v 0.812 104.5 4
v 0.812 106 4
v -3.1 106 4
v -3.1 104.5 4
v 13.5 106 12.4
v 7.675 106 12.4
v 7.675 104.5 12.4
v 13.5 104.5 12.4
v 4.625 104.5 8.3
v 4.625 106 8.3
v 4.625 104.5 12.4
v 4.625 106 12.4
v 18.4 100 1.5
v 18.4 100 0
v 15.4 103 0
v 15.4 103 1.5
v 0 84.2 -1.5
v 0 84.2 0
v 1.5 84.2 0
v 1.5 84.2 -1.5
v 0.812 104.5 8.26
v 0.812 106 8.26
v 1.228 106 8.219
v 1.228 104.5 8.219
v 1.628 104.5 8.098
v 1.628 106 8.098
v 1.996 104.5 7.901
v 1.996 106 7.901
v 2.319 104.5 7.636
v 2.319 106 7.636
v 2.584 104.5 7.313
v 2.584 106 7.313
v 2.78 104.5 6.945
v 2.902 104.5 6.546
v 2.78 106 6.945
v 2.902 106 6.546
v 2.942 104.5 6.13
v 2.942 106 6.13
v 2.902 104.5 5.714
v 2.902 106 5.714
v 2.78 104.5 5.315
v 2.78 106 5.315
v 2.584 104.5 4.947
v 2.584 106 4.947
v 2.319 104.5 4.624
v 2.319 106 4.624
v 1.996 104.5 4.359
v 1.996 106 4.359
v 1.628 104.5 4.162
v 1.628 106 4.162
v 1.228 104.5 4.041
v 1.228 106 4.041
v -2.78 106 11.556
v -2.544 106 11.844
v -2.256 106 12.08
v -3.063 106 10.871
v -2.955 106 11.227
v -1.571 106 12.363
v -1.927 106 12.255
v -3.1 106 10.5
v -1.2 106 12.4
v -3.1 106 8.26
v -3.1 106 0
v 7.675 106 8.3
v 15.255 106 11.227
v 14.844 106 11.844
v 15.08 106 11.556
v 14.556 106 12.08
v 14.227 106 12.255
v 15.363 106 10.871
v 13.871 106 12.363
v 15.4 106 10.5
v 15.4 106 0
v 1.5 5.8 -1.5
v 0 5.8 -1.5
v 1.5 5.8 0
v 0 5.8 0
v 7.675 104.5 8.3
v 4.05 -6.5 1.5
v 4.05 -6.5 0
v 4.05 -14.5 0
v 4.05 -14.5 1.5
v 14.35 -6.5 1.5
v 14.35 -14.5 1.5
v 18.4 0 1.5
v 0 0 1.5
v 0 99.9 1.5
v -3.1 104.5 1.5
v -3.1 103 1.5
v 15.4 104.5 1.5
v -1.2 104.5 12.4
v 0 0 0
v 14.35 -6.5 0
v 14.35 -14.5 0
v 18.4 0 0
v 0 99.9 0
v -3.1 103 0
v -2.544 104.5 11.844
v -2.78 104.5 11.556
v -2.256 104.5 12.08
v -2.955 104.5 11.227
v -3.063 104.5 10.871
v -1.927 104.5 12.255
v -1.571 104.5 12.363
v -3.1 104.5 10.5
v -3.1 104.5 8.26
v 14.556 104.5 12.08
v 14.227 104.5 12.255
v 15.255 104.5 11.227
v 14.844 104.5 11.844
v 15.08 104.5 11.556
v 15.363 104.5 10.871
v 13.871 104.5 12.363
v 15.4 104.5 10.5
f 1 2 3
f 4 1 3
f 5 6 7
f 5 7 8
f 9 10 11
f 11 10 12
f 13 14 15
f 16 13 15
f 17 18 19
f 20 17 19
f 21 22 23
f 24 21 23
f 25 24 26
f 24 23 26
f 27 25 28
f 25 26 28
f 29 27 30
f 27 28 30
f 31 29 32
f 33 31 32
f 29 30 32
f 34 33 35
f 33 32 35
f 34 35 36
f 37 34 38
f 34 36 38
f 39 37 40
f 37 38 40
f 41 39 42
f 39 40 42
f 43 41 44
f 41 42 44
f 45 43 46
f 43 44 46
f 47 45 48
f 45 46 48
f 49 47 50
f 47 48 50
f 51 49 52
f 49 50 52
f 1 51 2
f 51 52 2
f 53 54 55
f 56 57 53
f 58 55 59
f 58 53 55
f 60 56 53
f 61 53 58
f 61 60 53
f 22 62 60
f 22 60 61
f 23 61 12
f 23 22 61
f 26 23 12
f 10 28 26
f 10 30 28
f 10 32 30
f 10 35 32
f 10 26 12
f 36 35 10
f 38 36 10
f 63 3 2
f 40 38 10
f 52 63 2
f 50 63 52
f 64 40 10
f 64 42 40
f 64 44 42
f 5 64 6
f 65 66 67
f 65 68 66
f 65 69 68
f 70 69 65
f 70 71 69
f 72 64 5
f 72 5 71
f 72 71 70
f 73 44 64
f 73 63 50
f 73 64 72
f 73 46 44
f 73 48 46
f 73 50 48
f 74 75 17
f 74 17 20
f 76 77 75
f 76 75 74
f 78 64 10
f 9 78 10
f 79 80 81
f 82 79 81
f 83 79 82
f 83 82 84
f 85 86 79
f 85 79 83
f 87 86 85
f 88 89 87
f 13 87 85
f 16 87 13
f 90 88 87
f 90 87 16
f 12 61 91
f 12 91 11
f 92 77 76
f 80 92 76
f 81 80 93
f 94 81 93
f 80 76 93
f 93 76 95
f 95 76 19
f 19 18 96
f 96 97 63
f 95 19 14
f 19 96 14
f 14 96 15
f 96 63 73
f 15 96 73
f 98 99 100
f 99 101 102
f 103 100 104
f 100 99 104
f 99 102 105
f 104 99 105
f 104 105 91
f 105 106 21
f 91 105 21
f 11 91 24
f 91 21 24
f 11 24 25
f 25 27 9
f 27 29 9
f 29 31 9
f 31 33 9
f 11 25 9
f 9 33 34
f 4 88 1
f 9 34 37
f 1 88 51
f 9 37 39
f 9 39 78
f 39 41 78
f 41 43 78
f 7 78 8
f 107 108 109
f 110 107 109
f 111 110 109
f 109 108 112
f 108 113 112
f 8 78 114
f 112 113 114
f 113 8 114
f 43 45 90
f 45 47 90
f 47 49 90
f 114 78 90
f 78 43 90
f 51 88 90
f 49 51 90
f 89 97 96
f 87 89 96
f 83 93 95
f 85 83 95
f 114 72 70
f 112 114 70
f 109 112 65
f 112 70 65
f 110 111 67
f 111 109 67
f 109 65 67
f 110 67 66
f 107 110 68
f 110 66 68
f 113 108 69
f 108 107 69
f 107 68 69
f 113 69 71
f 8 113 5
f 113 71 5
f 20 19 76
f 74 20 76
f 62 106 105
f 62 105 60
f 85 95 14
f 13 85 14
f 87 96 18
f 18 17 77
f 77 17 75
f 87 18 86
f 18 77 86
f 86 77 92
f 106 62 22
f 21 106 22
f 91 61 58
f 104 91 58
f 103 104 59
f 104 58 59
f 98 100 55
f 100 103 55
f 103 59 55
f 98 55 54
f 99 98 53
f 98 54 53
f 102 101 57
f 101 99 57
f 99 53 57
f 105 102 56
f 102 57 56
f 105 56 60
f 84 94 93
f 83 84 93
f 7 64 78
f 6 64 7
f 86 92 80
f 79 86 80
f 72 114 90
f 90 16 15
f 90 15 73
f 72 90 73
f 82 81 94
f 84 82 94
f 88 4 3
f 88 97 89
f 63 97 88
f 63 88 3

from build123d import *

# Parameters (mm, degrees)
F1_DEPTH = 1.5
F2_W     = 18.5
F2_H     = 1.5
F3_DEPTH = 10.9
F4_W     = 3.05
F4_H     = 4.1
F5_DEPTH = 25
F6_W     = 1.5
F6_H     = 78.4
F7_DEPTH = 1.5


with BuildPart() as f1:
    # F0 (on Top) → F1 (new body)
    with BuildSketch(Plane.XY):
        Polygon((-3.1, 103), (0, 99.9), (0, 0), (4.05, -6.5), (4.05, -14.5), (14.35, -14.5), (14.35, -6.5), (18.4, 0), (18.4, 100), (15.4, 103), (15.4, 106), (-3.1, 106), align=None)
    extrude(amount=F1_DEPTH)

    # F2 (on face) → F3 (join)
    with BuildSketch(Plane.XY.offset(1.5)):
        with Locations((6.15, 105.25)):
            Rectangle(F2_W, F2_H)
    extrude(amount=F3_DEPTH)

    # F4 (on face) → F5 (cut)
    with BuildSketch(Plane(origin=(0, 106, 0), x_dir=(-1, 0, 0), z_dir=(0, 1, 0))):
        with Locations((-6.15, 10.35)):
            Rectangle(F4_W, F4_H)
        with BuildLine():
            ThreePointArc((-15.4, 10.5), (-14.843503, 11.843503), (-13.5, 12.4))
            Line((-13.5, 12.4), (-15.4, 12.4))
            Line((-15.4, 12.4), (-15.4, 10.5))
        make_face()
        with BuildLine():
            Line((3.1, 12.4), (1.2, 12.4))
            ThreePointArc((1.2, 12.4), (2.543503, 11.843503), (3.1, 10.5))
            Line((3.1, 10.5), (3.1, 12.4))
        make_face()
        with BuildLine():
            Line((3.1, 8.26), (-0.8125, 8.26))
            ThreePointArc((-0.8125, 8.26), (-2.9425, 6.13), (-0.8125, 4))
            Line((-0.8125, 4), (3.1, 4))
            Line((3.1, 4), (3.1, 8.26))
        make_face()
    extrude(amount=-F5_DEPTH, mode=Mode.SUBTRACT)

    # F6 (on face) → F7 (join)
    with BuildSketch(Plane(origin=(0, 0, 0), x_dir=(1, 0, 0), z_dir=(0, 0, -1))):
        with Locations((0.75, -45)):
            Rectangle(F6_W, F6_H)
    extrude(amount=F7_DEPTH)


solid = f1.part
